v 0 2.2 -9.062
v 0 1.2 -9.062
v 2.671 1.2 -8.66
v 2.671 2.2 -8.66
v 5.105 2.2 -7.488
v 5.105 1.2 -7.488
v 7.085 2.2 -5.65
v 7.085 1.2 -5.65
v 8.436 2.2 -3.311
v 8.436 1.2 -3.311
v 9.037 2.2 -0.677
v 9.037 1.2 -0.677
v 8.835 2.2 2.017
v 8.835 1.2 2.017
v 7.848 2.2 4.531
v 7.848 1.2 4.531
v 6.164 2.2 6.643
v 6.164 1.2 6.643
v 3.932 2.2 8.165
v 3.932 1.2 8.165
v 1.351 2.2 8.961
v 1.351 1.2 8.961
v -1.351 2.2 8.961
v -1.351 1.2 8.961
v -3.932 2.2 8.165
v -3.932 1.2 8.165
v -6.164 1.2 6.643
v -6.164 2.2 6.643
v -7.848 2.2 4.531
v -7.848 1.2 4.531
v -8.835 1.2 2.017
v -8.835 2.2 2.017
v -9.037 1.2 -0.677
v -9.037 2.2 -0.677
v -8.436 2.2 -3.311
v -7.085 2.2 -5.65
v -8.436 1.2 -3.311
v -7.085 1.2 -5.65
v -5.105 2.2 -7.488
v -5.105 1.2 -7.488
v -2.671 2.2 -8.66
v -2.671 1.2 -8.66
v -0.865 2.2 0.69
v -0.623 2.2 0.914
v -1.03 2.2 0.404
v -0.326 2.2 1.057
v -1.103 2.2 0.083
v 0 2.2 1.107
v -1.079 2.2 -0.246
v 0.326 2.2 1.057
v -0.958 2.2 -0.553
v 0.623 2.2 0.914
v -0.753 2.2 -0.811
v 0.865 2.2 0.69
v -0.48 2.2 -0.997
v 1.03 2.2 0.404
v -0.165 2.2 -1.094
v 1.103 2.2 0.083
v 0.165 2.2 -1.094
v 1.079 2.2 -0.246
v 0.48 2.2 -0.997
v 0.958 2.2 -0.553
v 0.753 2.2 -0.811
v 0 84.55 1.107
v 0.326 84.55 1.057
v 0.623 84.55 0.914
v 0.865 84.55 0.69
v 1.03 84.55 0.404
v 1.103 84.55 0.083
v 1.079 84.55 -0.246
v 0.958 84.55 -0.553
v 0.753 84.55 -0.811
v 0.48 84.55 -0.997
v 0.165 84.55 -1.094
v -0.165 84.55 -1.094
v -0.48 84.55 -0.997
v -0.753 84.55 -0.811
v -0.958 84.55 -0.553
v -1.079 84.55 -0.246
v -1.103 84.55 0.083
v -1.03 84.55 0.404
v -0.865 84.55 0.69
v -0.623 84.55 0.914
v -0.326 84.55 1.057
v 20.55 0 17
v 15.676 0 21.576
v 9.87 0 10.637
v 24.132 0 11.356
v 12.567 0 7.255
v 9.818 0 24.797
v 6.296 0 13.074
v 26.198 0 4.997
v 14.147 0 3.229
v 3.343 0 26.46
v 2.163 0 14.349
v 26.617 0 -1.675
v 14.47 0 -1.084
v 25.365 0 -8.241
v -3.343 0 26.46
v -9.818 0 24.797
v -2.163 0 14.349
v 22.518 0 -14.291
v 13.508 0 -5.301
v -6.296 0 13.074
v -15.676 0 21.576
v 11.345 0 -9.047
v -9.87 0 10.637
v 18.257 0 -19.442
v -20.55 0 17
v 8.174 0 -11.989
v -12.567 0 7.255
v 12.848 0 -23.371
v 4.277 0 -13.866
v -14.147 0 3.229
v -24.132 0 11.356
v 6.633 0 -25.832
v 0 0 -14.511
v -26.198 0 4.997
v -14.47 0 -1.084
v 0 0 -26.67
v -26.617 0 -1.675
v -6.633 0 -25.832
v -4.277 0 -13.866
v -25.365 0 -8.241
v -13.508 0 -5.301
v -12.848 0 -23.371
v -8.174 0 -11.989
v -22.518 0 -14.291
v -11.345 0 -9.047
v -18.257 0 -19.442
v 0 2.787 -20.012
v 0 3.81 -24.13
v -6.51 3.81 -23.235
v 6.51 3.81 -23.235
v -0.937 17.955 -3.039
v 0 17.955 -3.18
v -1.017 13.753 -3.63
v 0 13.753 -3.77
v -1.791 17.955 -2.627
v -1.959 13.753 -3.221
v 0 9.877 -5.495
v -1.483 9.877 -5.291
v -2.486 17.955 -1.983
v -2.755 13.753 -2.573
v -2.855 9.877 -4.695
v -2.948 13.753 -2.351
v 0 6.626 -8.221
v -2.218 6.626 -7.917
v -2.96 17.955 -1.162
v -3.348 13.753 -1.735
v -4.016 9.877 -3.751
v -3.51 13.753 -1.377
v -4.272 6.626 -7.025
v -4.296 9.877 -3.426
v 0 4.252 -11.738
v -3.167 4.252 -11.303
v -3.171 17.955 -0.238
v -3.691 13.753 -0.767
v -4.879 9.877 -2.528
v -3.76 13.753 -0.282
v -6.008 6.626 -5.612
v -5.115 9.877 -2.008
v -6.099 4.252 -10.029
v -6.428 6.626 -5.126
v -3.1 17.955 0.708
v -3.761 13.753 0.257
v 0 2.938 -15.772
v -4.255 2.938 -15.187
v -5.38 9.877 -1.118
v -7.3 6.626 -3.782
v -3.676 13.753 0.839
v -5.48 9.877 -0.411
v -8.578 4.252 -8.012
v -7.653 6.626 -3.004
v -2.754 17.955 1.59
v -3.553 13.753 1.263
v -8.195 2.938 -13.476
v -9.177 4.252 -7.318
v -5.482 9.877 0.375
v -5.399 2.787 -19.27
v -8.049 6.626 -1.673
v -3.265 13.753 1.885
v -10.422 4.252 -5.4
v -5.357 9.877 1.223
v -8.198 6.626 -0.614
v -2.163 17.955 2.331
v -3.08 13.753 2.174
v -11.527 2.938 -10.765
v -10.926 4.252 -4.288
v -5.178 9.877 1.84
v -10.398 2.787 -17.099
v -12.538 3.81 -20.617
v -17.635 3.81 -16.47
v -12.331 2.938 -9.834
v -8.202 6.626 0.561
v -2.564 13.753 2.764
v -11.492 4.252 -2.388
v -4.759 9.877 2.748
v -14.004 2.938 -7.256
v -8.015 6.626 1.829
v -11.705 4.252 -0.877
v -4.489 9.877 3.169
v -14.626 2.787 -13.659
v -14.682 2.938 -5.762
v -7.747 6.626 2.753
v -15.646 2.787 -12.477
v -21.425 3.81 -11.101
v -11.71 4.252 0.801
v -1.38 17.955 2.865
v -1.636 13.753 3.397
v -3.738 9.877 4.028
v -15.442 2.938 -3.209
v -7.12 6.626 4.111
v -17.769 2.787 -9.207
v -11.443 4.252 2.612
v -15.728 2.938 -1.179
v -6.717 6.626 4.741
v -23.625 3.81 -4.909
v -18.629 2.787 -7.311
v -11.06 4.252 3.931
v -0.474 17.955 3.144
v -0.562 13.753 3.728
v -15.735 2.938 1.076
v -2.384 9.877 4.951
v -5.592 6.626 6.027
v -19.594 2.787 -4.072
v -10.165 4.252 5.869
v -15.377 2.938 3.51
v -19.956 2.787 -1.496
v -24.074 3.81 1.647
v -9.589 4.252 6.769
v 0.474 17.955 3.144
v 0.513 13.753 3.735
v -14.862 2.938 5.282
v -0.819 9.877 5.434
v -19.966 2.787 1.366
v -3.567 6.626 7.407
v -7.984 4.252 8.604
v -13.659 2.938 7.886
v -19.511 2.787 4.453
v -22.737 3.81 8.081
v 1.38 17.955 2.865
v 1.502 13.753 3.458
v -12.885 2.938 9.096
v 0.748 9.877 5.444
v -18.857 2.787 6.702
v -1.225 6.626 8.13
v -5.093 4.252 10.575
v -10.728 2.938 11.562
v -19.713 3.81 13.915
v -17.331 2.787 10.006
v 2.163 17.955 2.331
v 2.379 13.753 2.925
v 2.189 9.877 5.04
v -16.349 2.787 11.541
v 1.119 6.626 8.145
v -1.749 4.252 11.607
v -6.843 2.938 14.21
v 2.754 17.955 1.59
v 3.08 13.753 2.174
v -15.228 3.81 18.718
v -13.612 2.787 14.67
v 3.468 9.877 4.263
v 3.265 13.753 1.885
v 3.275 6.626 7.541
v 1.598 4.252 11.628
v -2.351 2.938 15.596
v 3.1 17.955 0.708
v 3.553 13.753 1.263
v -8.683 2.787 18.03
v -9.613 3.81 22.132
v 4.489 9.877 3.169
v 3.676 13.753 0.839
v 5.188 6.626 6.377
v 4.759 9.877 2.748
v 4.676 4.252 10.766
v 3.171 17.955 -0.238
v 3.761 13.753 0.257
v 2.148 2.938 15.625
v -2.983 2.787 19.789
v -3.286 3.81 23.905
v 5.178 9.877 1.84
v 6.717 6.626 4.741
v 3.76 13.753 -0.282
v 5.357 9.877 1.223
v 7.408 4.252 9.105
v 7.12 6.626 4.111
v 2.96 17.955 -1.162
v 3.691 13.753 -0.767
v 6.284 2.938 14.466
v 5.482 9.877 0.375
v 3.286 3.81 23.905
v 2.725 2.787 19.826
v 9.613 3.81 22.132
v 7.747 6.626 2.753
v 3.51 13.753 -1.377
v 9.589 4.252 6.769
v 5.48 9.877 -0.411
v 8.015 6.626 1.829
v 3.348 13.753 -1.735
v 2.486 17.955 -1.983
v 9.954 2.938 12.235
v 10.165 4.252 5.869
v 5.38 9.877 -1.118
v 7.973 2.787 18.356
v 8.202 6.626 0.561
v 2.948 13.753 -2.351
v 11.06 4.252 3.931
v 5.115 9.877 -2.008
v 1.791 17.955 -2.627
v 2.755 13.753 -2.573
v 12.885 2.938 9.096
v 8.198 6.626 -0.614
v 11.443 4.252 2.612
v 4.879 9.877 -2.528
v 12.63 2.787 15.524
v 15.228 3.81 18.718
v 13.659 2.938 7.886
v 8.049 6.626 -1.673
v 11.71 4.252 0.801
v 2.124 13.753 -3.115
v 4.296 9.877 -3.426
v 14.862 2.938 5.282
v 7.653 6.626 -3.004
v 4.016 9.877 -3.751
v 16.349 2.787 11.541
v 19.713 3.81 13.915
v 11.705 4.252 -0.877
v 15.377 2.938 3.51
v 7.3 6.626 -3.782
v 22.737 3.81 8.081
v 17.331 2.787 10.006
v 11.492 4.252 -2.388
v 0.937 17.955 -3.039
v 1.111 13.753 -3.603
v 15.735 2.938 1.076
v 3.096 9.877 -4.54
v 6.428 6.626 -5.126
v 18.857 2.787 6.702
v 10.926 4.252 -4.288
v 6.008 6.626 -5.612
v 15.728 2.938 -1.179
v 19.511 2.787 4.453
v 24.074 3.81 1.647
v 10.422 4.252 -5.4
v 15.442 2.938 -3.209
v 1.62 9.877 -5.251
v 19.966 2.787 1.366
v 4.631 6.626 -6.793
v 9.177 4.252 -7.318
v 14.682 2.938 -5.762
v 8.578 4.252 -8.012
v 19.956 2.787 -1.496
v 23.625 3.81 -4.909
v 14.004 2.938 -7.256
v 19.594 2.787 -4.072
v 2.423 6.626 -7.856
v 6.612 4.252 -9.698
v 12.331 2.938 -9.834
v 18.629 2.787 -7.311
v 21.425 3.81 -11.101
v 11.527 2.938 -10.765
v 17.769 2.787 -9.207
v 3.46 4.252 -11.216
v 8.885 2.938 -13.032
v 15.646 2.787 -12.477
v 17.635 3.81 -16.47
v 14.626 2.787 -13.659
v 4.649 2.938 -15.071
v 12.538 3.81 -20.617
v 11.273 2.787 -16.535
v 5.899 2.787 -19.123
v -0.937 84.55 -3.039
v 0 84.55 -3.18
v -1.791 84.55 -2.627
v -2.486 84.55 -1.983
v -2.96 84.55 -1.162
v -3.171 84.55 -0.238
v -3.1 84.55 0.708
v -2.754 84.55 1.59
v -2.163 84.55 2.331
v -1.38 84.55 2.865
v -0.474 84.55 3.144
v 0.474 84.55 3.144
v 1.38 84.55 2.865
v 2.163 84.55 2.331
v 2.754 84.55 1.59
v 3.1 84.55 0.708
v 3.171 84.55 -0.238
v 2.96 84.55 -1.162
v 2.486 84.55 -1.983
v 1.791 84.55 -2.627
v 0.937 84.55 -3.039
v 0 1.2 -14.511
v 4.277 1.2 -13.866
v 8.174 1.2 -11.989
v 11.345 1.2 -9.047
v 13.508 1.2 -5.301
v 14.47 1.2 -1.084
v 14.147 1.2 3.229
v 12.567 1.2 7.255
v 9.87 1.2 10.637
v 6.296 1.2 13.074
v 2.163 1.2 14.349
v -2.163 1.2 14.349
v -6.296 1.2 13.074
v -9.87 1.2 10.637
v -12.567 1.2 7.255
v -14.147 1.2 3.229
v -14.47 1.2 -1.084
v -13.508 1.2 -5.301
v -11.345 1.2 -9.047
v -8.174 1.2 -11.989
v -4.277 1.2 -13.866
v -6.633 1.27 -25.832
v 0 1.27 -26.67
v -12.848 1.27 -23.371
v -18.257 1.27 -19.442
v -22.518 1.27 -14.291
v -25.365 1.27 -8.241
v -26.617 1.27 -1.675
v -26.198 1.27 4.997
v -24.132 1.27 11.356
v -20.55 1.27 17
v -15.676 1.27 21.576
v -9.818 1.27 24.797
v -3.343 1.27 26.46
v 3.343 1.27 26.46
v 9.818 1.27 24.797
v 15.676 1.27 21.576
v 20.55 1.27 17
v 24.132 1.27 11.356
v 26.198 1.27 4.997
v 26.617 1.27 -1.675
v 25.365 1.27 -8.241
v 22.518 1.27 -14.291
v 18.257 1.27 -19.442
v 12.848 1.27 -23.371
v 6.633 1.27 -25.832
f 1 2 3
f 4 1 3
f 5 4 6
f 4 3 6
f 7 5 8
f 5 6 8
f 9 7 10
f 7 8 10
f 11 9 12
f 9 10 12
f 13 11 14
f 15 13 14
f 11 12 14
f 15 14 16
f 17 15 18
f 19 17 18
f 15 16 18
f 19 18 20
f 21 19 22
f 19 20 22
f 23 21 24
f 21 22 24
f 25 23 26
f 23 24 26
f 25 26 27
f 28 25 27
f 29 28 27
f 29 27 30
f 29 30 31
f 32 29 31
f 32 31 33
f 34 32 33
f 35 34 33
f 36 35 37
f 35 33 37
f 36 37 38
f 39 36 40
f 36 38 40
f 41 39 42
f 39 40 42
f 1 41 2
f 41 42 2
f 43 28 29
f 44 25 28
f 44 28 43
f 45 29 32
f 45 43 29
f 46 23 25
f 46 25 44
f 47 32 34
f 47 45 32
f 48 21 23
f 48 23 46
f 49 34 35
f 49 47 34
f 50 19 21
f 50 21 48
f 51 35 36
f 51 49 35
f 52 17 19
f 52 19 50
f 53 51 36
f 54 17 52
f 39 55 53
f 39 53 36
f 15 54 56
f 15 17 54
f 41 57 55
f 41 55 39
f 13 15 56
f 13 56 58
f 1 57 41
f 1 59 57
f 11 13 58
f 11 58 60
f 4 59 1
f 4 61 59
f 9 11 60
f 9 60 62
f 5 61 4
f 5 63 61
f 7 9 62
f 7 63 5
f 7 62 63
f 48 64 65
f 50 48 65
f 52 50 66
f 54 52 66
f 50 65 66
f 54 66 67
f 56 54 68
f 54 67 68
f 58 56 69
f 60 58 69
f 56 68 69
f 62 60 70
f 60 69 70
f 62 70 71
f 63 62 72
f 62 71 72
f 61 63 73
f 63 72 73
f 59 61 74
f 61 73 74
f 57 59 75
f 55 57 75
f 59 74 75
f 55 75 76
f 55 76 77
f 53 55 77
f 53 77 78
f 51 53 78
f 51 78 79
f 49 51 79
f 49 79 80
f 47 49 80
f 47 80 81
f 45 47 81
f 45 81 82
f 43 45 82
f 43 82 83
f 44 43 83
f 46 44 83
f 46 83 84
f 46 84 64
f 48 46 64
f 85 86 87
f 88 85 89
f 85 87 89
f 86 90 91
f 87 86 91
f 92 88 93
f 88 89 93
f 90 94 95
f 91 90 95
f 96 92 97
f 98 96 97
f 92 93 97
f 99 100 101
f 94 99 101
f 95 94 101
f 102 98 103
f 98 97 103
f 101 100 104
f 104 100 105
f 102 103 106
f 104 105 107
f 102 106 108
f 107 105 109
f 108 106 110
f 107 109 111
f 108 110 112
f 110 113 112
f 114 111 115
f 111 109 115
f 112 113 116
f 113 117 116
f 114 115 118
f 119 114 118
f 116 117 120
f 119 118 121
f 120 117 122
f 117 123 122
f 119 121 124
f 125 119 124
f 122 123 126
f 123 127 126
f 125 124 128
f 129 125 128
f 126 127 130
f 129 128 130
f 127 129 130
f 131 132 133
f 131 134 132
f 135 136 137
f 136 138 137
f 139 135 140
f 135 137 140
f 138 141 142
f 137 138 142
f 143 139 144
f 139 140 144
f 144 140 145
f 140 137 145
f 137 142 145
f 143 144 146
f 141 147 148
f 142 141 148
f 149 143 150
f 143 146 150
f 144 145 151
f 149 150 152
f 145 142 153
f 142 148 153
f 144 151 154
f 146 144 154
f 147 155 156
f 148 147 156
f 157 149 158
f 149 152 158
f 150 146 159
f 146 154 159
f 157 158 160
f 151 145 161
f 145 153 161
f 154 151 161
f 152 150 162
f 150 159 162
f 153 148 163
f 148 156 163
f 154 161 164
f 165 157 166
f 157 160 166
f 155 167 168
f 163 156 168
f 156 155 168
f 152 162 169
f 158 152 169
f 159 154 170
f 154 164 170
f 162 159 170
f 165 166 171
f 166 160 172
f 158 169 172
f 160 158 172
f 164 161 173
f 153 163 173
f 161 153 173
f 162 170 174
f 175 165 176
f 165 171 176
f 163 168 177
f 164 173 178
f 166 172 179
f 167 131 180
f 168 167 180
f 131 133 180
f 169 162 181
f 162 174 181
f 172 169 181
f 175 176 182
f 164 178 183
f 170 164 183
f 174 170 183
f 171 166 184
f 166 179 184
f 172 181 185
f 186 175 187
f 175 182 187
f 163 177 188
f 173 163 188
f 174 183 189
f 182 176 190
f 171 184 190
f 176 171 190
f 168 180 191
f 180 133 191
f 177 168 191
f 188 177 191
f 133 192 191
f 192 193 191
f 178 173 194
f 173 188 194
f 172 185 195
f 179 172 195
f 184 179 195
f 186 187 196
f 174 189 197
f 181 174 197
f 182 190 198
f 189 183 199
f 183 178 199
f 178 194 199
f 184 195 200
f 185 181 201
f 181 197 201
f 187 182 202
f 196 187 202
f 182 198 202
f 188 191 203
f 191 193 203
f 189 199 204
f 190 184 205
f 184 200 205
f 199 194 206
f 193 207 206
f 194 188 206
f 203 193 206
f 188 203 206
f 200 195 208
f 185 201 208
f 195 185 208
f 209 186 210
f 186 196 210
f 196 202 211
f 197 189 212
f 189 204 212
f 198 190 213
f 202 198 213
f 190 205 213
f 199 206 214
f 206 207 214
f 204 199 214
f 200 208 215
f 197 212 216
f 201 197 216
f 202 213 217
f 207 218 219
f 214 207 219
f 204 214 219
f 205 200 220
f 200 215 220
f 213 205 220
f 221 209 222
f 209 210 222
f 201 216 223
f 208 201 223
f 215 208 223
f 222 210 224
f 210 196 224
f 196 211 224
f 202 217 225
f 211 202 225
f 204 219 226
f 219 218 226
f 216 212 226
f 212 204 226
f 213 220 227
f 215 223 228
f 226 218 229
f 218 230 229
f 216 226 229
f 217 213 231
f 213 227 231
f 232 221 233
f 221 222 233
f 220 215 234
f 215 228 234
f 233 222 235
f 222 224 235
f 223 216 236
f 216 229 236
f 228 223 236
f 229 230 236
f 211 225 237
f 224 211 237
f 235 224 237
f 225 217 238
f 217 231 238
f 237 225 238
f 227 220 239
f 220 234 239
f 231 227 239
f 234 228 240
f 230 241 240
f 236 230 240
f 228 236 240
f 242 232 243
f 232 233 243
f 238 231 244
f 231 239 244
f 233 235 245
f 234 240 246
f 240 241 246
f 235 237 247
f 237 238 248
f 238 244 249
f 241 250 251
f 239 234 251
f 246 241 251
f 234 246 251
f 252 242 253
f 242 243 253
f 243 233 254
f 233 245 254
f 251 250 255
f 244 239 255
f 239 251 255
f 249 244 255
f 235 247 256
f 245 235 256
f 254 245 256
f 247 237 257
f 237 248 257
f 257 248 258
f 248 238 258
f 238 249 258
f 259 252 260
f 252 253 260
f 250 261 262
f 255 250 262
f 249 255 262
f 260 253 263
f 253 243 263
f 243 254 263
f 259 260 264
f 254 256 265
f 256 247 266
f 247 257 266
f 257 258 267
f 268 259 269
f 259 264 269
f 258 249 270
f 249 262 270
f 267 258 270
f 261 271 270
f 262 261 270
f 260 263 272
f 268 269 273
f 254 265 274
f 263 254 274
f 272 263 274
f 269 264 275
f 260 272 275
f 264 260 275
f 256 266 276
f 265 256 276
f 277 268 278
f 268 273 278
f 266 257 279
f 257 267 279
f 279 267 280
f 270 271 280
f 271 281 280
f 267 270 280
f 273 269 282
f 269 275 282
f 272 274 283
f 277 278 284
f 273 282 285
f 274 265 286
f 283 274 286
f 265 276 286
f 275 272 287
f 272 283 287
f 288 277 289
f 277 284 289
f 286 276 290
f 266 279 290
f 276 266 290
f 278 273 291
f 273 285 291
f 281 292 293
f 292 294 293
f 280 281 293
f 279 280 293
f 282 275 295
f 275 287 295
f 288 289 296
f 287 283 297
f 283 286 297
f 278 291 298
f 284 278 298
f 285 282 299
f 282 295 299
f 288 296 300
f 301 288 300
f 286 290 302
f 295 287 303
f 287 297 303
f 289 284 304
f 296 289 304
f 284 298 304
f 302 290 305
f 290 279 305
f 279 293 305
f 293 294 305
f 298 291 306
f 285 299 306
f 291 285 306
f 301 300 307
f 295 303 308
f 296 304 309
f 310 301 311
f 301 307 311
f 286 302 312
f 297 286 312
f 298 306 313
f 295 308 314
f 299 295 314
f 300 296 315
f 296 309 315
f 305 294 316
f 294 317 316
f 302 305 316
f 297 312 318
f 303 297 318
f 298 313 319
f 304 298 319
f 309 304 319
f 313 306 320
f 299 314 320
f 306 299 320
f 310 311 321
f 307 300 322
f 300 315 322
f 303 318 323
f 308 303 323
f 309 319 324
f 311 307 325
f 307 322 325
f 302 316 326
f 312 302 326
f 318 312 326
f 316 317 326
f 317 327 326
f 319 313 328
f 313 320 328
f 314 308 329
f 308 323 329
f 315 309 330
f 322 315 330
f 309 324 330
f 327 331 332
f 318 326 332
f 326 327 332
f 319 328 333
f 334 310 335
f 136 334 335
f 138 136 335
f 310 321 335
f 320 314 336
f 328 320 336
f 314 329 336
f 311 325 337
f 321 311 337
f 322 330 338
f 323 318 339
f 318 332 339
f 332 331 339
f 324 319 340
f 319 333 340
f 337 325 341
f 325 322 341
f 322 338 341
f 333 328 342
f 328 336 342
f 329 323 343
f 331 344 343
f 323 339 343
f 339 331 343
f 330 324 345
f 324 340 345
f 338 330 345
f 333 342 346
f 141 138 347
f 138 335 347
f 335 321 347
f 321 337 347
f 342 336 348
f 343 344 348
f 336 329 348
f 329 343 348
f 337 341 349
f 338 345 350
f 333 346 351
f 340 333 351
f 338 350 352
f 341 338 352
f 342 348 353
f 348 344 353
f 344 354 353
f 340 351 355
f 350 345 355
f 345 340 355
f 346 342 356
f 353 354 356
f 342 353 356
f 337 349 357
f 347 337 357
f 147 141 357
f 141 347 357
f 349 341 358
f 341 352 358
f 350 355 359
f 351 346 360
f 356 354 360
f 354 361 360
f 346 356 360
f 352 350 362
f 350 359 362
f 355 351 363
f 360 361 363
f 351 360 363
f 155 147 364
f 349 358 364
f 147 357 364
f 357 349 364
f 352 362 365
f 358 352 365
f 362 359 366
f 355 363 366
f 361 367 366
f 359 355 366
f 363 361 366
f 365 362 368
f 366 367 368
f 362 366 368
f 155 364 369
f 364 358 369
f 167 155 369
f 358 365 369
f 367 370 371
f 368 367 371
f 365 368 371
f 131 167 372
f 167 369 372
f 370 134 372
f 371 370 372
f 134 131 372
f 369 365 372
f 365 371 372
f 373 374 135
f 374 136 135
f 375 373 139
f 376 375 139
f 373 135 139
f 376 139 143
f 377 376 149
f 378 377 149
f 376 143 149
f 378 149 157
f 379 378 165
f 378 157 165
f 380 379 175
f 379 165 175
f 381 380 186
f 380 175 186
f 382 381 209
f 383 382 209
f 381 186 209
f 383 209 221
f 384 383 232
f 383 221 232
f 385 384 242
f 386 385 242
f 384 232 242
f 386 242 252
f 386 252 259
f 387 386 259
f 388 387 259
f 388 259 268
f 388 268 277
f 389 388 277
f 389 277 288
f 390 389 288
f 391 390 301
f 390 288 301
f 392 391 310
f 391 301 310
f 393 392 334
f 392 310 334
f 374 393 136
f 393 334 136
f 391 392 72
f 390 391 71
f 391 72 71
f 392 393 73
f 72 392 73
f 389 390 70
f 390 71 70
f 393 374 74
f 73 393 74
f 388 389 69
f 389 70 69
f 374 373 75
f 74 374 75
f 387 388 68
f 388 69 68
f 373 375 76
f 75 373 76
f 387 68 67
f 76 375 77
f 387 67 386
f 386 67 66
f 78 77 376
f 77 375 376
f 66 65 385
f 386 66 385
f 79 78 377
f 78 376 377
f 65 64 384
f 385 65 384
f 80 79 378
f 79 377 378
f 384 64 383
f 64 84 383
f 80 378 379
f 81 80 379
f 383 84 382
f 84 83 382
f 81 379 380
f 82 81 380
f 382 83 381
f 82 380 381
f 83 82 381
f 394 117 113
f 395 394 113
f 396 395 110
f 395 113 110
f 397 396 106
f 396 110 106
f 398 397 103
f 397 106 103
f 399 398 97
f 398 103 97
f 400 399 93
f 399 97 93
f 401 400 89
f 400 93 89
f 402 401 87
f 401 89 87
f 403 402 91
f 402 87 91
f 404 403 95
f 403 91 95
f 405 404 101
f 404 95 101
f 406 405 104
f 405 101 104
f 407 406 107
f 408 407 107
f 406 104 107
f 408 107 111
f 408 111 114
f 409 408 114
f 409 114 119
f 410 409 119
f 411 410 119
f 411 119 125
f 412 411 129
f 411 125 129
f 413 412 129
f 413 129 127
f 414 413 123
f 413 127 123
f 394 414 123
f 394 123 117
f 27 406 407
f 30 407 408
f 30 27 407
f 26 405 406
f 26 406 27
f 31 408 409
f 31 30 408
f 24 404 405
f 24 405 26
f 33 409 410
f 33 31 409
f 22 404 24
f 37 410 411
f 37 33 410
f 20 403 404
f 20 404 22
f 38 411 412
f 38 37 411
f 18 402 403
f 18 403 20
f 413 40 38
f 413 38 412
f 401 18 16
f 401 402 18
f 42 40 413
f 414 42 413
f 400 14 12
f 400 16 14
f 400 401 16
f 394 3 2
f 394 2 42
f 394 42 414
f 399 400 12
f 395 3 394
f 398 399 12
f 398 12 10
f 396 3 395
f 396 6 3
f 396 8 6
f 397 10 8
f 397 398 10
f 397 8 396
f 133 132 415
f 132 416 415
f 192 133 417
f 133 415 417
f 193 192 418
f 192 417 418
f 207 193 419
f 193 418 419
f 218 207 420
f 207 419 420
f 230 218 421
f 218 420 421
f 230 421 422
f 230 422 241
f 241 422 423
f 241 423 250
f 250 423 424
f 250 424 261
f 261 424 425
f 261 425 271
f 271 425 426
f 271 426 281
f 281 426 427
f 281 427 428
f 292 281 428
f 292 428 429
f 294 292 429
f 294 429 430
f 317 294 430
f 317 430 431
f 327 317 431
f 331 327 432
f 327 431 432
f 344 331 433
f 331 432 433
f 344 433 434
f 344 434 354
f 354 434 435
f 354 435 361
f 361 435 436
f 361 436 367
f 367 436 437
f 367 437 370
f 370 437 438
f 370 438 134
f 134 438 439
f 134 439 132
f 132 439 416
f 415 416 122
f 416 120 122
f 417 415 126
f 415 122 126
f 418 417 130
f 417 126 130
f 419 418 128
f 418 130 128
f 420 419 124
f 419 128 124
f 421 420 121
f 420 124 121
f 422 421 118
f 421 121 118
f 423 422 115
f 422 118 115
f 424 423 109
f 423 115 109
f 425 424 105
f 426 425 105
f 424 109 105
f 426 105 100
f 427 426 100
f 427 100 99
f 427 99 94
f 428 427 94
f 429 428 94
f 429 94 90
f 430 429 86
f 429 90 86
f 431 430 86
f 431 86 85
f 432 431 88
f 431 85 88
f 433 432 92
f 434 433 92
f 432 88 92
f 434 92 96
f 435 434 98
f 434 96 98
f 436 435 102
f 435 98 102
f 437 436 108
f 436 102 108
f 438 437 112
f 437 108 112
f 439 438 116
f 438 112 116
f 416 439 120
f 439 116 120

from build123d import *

# Parameters (mm, degrees)
SKETCH2_R          = 14.510934511
CUT_EXTRUDE1_DEPTH = 1.2
SKETCH3_R          = 1.106535356
CUT_EXTRUDE2_DEPTH = 95.2
SKETCH4_R          = 9.062497532
CUT_EXTRUDE3_DEPTH = 1


with BuildPart() as part:
    # Sketch1 → Revolve1 (revolve)
    with BuildSketch(Plane.XY, mode=Mode.PRIVATE) as revolve1_sk:
        with BuildLine():
            Line((0, 0), (0, 84.55))
            Line((0, 84.55), (3.18, 84.55))
            Line((3.18, 84.55), (3.18, 17.954698654))
            ThreePointArc((3.18, 17.954698654), (9.896609701, 5.315721242), (24.13, 3.81))
            Line((24.13, 3.81), (26.67, 1.27))
            Line((26.67, 1.27), (26.67, 0))
            Line((26.67, 0), (0, 0))
        make_face()
    revolve(revolve1_sk.sketch.rotate(Axis((0, 0, 0), (0, 1, 0)), 90), axis=Axis((0, 0, 0), (0, 1, 0)))

    # Sketch2 → Cut-Extrude1 (cut)
    with BuildSketch(Plane.XZ):
        with Locations(Location((0, 0, 0), (0, 0, 270))):
            Circle(SKETCH2_R)
    extrude(amount=-CUT_EXTRUDE1_DEPTH, mode=Mode.SUBTRACT)

    # Sketch3 → Cut-Extrude2 (cut)
    with BuildSketch(Plane(origin=(0, 84.55, 0), x_dir=(1, 0, 0), z_dir=(0, 1, 0))):
        with Locations(Location((0, 0, 0), (0, 0, 270))):
            Circle(SKETCH3_R)
    extrude(amount=-CUT_EXTRUDE2_DEPTH, mode=Mode.SUBTRACT)

    # Sketch4 → Cut-Extrude3 (cut)
    with BuildSketch(Plane.XZ.offset(-1.2)):
        with Locations(Location((0, 0, 0), (0, 0, 270))):
            Circle(SKETCH4_R)
    extrude(amount=-CUT_EXTRUDE3_DEPTH, mode=Mode.SUBTRACT)


solid = part.part
